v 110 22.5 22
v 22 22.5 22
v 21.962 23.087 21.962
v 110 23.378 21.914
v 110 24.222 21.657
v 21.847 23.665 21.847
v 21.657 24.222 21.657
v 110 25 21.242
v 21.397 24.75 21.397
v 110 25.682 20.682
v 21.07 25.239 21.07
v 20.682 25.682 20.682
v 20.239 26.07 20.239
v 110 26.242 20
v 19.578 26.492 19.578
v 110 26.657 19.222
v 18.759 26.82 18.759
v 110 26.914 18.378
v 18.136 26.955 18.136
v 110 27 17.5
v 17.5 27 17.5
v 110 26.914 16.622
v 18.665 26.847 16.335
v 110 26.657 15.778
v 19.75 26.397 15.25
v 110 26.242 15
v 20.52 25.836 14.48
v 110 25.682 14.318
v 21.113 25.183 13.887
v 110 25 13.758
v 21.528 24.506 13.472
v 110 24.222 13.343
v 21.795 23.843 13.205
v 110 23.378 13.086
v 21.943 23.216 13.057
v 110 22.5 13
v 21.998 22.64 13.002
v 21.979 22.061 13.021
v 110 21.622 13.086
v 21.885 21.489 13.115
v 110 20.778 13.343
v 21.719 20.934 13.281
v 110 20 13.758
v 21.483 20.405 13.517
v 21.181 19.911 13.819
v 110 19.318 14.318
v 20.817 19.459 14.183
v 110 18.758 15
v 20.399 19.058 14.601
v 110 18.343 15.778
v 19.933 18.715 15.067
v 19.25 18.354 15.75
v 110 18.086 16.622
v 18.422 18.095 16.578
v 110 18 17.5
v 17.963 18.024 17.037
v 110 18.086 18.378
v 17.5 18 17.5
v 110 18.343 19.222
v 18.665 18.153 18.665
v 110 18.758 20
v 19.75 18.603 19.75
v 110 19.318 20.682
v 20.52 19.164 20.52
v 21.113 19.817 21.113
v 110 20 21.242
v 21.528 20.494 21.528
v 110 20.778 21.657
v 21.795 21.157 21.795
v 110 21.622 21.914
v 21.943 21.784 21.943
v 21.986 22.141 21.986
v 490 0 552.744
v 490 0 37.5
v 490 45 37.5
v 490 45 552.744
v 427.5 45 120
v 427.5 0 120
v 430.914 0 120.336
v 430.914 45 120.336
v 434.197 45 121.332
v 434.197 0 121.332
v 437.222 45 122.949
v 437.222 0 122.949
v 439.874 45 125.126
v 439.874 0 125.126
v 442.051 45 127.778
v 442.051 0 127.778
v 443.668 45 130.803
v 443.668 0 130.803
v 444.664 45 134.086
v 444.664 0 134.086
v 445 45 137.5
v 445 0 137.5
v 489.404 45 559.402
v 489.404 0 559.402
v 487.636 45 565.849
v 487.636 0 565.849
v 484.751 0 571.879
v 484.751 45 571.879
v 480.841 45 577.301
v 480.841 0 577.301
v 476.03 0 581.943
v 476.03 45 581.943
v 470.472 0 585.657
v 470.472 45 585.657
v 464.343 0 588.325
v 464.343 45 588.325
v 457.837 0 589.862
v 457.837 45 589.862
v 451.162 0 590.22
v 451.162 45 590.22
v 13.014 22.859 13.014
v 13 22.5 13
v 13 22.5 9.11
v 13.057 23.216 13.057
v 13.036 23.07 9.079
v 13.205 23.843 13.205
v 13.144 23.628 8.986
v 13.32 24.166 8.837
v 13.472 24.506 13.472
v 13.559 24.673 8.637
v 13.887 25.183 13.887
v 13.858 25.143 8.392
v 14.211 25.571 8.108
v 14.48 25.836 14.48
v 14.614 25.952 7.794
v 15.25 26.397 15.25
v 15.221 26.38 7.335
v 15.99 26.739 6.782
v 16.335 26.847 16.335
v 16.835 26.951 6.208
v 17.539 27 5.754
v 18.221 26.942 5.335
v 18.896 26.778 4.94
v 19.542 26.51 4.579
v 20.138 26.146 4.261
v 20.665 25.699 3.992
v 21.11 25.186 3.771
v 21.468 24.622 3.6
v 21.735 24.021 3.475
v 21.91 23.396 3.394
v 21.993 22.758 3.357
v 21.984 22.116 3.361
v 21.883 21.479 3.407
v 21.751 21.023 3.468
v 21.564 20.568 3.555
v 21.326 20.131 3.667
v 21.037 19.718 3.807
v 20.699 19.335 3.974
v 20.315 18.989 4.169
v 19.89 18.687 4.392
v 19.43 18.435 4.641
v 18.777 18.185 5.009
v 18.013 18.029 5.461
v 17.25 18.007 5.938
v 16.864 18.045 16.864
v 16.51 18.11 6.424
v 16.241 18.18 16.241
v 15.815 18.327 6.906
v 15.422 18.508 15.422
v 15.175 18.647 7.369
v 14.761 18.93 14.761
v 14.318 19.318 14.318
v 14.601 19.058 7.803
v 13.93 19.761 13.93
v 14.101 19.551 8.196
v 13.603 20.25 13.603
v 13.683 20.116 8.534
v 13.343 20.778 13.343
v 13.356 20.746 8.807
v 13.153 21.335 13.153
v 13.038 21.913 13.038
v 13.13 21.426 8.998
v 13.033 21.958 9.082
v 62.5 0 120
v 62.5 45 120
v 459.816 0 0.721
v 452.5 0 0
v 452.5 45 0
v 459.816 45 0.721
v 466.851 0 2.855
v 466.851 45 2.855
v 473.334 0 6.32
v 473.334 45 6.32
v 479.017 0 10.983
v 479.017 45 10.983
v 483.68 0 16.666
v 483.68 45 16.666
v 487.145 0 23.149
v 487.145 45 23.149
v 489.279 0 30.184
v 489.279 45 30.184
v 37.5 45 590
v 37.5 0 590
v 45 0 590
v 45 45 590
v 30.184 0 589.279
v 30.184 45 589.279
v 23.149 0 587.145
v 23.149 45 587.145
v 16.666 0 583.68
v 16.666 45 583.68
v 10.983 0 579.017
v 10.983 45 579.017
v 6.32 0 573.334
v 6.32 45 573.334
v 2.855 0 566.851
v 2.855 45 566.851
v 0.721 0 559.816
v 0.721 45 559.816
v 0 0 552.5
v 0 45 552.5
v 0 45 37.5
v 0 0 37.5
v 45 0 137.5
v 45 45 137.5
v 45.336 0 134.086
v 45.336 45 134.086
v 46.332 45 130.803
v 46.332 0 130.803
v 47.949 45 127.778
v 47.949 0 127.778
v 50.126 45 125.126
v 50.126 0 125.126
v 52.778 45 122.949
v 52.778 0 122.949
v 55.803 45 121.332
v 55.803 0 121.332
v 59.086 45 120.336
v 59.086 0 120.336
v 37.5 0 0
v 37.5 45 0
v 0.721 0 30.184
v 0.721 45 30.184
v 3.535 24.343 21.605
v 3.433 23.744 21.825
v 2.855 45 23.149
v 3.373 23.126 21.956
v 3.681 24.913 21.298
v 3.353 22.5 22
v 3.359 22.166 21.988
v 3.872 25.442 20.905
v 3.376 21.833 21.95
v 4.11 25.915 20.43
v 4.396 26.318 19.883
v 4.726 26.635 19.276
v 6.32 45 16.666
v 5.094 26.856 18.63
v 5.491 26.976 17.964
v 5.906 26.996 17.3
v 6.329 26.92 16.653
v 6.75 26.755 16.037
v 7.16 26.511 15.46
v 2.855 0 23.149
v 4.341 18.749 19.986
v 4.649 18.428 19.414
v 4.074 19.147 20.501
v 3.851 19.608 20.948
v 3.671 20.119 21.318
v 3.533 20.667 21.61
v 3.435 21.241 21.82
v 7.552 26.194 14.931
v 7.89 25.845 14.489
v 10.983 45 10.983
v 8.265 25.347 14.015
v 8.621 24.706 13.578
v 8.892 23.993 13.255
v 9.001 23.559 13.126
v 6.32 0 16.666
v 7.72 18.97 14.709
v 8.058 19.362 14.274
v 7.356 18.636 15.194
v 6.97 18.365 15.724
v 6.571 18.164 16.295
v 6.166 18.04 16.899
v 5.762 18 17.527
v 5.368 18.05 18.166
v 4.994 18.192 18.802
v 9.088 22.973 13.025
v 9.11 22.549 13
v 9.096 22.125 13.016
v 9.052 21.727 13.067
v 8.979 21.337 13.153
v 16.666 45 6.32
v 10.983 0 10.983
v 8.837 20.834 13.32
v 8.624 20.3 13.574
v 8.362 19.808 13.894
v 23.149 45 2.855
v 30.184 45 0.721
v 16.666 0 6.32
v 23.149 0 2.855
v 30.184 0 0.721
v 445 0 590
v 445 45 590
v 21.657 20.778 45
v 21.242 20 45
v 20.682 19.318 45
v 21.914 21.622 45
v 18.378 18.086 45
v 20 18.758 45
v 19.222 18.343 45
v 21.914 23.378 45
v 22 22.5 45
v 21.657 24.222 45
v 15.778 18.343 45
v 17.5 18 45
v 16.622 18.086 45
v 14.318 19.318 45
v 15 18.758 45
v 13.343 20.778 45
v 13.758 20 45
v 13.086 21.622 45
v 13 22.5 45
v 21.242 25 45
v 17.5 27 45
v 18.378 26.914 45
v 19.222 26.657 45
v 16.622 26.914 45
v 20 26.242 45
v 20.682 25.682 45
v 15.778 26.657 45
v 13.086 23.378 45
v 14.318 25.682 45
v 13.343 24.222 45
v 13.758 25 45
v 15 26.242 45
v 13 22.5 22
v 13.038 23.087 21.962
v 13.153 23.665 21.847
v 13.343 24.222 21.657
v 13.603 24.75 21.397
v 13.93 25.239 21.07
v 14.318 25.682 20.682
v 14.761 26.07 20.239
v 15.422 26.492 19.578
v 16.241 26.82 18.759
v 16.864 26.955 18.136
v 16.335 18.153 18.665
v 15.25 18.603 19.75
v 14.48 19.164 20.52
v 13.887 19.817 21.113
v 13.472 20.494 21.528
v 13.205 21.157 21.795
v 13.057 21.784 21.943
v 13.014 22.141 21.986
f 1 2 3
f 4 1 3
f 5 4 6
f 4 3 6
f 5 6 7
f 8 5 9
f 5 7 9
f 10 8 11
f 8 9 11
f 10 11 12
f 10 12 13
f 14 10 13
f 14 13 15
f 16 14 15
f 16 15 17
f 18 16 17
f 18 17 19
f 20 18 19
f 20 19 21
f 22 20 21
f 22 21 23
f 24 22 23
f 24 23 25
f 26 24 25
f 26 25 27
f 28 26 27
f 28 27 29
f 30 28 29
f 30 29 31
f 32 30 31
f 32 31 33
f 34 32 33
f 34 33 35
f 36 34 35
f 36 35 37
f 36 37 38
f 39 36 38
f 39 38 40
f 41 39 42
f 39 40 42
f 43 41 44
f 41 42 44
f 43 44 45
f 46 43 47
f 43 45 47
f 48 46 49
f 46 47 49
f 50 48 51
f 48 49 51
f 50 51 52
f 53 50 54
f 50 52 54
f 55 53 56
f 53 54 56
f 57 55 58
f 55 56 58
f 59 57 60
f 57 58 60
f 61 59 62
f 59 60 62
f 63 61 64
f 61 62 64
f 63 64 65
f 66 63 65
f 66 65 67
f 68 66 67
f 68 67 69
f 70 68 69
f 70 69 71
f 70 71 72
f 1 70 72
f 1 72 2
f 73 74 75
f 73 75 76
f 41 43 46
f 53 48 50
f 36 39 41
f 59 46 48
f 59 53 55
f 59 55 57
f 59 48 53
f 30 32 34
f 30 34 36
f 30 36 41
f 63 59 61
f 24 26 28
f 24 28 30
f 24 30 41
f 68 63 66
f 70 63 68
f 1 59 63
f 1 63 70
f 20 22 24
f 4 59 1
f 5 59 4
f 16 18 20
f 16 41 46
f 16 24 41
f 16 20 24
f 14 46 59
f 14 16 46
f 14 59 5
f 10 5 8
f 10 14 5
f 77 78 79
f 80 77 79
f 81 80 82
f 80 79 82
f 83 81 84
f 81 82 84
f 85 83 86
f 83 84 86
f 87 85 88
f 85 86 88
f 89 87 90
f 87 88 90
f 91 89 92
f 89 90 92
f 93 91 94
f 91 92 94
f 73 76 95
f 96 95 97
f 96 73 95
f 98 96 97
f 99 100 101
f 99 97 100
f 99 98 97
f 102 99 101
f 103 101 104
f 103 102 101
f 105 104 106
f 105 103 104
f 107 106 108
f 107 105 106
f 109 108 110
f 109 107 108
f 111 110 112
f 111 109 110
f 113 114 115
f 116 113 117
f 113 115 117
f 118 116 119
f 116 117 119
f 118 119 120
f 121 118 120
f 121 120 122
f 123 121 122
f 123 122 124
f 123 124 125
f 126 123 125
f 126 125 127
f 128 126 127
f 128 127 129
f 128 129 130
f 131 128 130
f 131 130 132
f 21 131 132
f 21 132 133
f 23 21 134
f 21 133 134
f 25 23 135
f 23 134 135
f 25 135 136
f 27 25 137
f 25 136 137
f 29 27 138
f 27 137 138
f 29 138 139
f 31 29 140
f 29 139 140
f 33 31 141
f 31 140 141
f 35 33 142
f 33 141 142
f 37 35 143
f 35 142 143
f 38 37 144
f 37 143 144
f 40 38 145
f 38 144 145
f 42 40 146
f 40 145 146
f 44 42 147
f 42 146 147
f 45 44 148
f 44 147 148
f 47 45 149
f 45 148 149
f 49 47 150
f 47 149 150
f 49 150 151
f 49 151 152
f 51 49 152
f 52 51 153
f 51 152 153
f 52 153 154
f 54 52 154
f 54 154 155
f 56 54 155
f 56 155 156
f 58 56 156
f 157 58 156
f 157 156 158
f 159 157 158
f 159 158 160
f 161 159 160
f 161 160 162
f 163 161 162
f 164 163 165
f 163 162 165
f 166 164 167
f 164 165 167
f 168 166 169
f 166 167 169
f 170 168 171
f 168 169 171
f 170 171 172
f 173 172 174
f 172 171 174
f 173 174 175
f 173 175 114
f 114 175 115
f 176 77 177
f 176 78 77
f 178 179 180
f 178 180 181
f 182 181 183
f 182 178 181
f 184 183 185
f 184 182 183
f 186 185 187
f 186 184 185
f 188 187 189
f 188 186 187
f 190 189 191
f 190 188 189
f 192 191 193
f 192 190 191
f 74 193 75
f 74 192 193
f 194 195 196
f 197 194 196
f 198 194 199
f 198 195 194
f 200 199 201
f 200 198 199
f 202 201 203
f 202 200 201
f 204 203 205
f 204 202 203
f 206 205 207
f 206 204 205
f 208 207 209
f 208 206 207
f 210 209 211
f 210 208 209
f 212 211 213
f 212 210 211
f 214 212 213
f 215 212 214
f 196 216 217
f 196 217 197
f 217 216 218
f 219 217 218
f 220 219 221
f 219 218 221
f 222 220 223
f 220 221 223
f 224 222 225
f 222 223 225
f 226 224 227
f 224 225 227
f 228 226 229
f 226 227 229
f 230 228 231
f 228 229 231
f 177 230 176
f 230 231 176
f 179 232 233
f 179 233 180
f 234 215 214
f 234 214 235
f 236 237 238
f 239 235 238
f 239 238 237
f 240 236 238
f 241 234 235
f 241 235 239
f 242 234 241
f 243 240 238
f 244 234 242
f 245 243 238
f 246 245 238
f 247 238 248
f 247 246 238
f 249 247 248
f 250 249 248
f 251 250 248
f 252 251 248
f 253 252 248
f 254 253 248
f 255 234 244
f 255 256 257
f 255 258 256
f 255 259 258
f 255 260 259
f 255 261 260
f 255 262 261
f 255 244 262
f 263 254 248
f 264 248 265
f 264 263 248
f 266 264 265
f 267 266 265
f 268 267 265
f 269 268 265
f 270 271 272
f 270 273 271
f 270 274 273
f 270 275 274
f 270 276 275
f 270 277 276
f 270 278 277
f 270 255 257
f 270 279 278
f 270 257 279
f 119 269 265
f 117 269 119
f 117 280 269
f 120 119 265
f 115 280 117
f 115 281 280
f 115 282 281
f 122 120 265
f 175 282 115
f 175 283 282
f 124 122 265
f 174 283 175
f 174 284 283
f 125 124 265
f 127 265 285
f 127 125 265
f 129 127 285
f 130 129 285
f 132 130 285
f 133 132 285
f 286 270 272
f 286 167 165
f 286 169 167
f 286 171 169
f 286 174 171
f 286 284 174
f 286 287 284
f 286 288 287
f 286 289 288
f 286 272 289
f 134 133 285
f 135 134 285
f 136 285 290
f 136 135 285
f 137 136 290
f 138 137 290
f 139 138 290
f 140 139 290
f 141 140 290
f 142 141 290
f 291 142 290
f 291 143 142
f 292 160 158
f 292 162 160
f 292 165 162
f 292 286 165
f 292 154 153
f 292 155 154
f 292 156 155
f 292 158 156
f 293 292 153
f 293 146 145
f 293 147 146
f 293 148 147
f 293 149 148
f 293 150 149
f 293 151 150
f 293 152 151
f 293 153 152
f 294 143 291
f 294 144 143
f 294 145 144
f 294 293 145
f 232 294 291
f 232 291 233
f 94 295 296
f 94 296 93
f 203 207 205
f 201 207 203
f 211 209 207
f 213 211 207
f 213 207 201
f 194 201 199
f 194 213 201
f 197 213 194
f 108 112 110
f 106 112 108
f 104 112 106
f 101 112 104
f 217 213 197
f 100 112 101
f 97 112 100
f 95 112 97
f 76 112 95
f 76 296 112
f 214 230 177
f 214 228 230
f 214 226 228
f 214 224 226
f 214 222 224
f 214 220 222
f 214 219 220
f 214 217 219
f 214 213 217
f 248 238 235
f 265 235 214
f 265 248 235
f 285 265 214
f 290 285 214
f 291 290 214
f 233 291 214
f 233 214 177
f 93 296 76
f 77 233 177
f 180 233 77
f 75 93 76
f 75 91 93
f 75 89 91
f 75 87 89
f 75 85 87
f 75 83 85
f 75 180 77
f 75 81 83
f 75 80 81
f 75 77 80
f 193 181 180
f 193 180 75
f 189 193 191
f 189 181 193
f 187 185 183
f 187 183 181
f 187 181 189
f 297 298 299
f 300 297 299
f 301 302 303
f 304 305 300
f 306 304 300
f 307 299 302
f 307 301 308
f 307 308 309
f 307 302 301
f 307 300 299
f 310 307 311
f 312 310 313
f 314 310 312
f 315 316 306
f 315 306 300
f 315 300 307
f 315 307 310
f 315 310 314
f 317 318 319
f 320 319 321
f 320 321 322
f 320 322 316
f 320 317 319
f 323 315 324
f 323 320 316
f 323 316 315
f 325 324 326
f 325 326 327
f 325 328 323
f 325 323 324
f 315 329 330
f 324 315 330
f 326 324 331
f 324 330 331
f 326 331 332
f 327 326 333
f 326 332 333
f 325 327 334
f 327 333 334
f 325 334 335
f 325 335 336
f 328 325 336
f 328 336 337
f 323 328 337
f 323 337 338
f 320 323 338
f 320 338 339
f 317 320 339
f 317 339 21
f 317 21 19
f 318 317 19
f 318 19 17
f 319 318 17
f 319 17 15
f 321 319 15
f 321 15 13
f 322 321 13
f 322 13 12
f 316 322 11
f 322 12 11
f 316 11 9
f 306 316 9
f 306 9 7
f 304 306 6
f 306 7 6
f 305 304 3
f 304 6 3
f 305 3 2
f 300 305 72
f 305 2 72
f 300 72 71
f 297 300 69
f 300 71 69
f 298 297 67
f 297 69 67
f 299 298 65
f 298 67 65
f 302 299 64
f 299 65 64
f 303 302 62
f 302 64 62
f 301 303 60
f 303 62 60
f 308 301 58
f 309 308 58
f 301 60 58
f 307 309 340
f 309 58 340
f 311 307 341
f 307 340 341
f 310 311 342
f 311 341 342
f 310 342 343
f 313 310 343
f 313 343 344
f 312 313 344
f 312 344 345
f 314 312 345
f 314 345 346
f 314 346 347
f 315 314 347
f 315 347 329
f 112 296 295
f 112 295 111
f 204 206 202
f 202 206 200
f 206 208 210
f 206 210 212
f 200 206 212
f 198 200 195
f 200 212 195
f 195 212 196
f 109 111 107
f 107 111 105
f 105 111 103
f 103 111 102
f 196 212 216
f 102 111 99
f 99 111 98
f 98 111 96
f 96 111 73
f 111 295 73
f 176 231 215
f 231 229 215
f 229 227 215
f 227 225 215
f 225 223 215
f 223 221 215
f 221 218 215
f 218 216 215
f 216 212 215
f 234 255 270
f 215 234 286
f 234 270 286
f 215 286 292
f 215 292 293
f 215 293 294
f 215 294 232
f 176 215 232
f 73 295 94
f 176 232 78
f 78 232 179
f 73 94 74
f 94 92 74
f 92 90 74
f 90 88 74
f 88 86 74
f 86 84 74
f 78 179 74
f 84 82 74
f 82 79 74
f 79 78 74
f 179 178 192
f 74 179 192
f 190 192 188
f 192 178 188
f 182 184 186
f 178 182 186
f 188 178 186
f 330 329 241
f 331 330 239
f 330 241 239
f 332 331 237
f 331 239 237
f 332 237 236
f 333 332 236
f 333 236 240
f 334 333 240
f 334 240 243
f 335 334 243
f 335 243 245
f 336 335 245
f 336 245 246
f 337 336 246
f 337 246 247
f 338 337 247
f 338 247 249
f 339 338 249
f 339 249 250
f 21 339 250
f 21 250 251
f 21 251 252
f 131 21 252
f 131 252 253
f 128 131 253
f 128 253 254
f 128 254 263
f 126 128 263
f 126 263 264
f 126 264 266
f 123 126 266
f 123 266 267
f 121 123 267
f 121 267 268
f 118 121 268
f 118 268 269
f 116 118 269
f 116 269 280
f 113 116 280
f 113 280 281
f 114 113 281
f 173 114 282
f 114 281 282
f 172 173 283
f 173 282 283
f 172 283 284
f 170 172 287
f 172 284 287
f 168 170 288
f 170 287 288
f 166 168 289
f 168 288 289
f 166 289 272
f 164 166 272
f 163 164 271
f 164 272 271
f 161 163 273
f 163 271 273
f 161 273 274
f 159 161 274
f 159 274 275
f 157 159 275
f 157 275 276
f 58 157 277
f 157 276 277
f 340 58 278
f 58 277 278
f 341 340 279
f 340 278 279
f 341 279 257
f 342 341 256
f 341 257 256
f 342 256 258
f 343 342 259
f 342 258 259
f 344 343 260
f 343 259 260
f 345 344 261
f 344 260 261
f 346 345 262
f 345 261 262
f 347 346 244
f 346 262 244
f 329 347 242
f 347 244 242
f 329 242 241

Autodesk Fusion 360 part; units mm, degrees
sketch "Sketch1" plane through (0, 0, 0) normal (0, 1, 0) x (1, 0, 0)
  line L0 (-207.5, 295) -> (207.5, 295)
  line L1 (245, 257.5) -> (245, -257.5)
  line L2 (-245, -257.5) -> (-245, 257.5)
  arc A0 (-207.5, 295) -> (-245, 257.5) centre (-207.5, 257.5) ccw
  arc A1 (245, 257.5) -> (207.5, 295) centre (207.5, 257.5) ccw
  arc A2 (207.5, -295) -> (245, -257.5) centre (207.5, -257.5) ccw
  arc A3 (-245, -257.5) -> (-207.5, -295) centre (-207.5, -257.5) ccw
  line L3 (-207.5, -295) -> (207.5, -295)
  line L4 (-207.5, 257.5) -> (207.5, -257.5) construction
  line L5 (-207.5, -257.5) -> (207.5, 257.5) construction
  point P0 (-245, 295)
  point P1 (245, 295)
  point P2 (-245, -523.5619)
  dimension "d2" = 490
  dimension "d6" = 37.5
  dimension "d10" = 590
extrude "Extrude1" add sketch "Sketch1" along normal blind 4
equation "d2 = 400 mm + 45 mm + 45 mm"
equation "d10 = 500.00 mm + 45 mm + 45 mm"

Autodesk Fusion 360 part; units mm, degrees
sketch "Sketch1" plane through (0, 0, 0) normal (0, 1, 0) x (1, 0, 0)
  line L0 (0, 0) -> (35, 0)
  line L1 (35, 0) -> (0, -35)
  line L2 (0, -35) -> (0, 0)
  dimension "d1" = 35
  dimension "d2" = 35
extrude "Extrude1" add sketch "Sketch1" along normal blind 45
sketch "Sketch2" plane through (0, 0, 0) normal (-1, 0, 0) x (0, 0, 1)
  line L0 (0, 0) -> (35, 0)
  line L1 (35, 0) -> (35, 45)
  line L2 (35, 45) -> (0, 45)
  line L3 (0, 45) -> (0, 0)
  line L4 (0, 45) -> (35, 0) construction
  circle A0 centre (17.5, 22.5) radius 4.5
  dimension "d5" = 9
extrude "Extrude2" cut sketch "Sketch2" against normal blind 110 contours A0
sketch "Sketch3" plane through (0, 0, 0) normal (0, 0, -1) x (-1, 0, 0)
  line L0 (-35, 0) -> (0, 0)
  line L1 (0, 0) -> (0, 45)
  line L2 (0, 45) -> (-35, 45)
  line L3 (-35, 45) -> (-35, 0)
  line L4 (0, 45) -> (-35, 0) construction
  circle A0 centre (-17.5, 22.5) radius 4.5
  point P0 (0, 22.5)
  dimension "d8" = 9
extrude "Extrude3" cut sketch "Sketch3" against normal blind 45 contours A0
sketch "Sketch4" plane through (0, 0, 0) normal (0, 0, -1) x (-1, 0, 0)
  circle A0 centre (-17.5, 22.5) radius 4.5
  line L0 (-35, 0) -> (0, 0)
  line L1 (0, 0) -> (0, 45)
  line L2 (0, 45) -> (-35, 45)
  line L3 (-35, 45) -> (-35, 0)
  point P0 (0, 22.5)

Autodesk Fusion 360 part; units mm, degrees
sketch "Sketch1" plane through (0, 0, 0) normal (0, 1, 0) x (1, 0, 0)
  line L0 (37.5, 0) -> (452.5, 0)
  line L1 (490, -37.5) -> (490, -552.7439)
  line L2 (0, -552.5) -> (0, -37.5)
  line L3 (445, -590) -> (445, -137.5)
  line L4 (427.5, -120) -> (62.5, -120)
  line L5 (45, -137.5) -> (45, -590)
  arc A0 (37.5, 0) -> (0, -37.5) centre (37.5, -37.5) ccw
  arc A1 (490, -37.5) -> (452.5, 0) centre (452.5, -37.5) ccw
  arc A2 (451.1619, -590.22) -> (490, -552.7439) centre (452.5, -552.7439) ccw
  arc A3 (0, -552.5) -> (37.5, -590) centre (37.5, -552.5) ccw
  arc A4 (62.5, -120) -> (45, -137.5) centre (62.5, -137.5) ccw
  arc A5 (445, -137.5) -> (427.5, -120) centre (427.5, -137.5) ccw
  line L6 (445, -590) -> (451.1619, -590.22)
  line L7 (37.5, -590) -> (45, -590)
  point P0 (490, 0)
  dimension "d1" = 45
  dimension "width" = 490
  dimension "d4" = 45
  dimension "d5" = 120
  dimension "d6" = 37.5
  dimension "d9" = 17.5
  dimension "length" = 590
  dimension "d11" = 590
extrude "Extrude1" add sketch "Sketch1" along normal blind 4
ref_plane "WorkPlane1" through (245, 0, 0) normal (1, 0, 0) x (0, 1, 0)
equation "width = 400 mm + 45 mm + 45 mm"
equation "length = 500.00 mm + 45 mm + 45 mm"
equation "d11 = length"
equation "d12 = width / 2"
